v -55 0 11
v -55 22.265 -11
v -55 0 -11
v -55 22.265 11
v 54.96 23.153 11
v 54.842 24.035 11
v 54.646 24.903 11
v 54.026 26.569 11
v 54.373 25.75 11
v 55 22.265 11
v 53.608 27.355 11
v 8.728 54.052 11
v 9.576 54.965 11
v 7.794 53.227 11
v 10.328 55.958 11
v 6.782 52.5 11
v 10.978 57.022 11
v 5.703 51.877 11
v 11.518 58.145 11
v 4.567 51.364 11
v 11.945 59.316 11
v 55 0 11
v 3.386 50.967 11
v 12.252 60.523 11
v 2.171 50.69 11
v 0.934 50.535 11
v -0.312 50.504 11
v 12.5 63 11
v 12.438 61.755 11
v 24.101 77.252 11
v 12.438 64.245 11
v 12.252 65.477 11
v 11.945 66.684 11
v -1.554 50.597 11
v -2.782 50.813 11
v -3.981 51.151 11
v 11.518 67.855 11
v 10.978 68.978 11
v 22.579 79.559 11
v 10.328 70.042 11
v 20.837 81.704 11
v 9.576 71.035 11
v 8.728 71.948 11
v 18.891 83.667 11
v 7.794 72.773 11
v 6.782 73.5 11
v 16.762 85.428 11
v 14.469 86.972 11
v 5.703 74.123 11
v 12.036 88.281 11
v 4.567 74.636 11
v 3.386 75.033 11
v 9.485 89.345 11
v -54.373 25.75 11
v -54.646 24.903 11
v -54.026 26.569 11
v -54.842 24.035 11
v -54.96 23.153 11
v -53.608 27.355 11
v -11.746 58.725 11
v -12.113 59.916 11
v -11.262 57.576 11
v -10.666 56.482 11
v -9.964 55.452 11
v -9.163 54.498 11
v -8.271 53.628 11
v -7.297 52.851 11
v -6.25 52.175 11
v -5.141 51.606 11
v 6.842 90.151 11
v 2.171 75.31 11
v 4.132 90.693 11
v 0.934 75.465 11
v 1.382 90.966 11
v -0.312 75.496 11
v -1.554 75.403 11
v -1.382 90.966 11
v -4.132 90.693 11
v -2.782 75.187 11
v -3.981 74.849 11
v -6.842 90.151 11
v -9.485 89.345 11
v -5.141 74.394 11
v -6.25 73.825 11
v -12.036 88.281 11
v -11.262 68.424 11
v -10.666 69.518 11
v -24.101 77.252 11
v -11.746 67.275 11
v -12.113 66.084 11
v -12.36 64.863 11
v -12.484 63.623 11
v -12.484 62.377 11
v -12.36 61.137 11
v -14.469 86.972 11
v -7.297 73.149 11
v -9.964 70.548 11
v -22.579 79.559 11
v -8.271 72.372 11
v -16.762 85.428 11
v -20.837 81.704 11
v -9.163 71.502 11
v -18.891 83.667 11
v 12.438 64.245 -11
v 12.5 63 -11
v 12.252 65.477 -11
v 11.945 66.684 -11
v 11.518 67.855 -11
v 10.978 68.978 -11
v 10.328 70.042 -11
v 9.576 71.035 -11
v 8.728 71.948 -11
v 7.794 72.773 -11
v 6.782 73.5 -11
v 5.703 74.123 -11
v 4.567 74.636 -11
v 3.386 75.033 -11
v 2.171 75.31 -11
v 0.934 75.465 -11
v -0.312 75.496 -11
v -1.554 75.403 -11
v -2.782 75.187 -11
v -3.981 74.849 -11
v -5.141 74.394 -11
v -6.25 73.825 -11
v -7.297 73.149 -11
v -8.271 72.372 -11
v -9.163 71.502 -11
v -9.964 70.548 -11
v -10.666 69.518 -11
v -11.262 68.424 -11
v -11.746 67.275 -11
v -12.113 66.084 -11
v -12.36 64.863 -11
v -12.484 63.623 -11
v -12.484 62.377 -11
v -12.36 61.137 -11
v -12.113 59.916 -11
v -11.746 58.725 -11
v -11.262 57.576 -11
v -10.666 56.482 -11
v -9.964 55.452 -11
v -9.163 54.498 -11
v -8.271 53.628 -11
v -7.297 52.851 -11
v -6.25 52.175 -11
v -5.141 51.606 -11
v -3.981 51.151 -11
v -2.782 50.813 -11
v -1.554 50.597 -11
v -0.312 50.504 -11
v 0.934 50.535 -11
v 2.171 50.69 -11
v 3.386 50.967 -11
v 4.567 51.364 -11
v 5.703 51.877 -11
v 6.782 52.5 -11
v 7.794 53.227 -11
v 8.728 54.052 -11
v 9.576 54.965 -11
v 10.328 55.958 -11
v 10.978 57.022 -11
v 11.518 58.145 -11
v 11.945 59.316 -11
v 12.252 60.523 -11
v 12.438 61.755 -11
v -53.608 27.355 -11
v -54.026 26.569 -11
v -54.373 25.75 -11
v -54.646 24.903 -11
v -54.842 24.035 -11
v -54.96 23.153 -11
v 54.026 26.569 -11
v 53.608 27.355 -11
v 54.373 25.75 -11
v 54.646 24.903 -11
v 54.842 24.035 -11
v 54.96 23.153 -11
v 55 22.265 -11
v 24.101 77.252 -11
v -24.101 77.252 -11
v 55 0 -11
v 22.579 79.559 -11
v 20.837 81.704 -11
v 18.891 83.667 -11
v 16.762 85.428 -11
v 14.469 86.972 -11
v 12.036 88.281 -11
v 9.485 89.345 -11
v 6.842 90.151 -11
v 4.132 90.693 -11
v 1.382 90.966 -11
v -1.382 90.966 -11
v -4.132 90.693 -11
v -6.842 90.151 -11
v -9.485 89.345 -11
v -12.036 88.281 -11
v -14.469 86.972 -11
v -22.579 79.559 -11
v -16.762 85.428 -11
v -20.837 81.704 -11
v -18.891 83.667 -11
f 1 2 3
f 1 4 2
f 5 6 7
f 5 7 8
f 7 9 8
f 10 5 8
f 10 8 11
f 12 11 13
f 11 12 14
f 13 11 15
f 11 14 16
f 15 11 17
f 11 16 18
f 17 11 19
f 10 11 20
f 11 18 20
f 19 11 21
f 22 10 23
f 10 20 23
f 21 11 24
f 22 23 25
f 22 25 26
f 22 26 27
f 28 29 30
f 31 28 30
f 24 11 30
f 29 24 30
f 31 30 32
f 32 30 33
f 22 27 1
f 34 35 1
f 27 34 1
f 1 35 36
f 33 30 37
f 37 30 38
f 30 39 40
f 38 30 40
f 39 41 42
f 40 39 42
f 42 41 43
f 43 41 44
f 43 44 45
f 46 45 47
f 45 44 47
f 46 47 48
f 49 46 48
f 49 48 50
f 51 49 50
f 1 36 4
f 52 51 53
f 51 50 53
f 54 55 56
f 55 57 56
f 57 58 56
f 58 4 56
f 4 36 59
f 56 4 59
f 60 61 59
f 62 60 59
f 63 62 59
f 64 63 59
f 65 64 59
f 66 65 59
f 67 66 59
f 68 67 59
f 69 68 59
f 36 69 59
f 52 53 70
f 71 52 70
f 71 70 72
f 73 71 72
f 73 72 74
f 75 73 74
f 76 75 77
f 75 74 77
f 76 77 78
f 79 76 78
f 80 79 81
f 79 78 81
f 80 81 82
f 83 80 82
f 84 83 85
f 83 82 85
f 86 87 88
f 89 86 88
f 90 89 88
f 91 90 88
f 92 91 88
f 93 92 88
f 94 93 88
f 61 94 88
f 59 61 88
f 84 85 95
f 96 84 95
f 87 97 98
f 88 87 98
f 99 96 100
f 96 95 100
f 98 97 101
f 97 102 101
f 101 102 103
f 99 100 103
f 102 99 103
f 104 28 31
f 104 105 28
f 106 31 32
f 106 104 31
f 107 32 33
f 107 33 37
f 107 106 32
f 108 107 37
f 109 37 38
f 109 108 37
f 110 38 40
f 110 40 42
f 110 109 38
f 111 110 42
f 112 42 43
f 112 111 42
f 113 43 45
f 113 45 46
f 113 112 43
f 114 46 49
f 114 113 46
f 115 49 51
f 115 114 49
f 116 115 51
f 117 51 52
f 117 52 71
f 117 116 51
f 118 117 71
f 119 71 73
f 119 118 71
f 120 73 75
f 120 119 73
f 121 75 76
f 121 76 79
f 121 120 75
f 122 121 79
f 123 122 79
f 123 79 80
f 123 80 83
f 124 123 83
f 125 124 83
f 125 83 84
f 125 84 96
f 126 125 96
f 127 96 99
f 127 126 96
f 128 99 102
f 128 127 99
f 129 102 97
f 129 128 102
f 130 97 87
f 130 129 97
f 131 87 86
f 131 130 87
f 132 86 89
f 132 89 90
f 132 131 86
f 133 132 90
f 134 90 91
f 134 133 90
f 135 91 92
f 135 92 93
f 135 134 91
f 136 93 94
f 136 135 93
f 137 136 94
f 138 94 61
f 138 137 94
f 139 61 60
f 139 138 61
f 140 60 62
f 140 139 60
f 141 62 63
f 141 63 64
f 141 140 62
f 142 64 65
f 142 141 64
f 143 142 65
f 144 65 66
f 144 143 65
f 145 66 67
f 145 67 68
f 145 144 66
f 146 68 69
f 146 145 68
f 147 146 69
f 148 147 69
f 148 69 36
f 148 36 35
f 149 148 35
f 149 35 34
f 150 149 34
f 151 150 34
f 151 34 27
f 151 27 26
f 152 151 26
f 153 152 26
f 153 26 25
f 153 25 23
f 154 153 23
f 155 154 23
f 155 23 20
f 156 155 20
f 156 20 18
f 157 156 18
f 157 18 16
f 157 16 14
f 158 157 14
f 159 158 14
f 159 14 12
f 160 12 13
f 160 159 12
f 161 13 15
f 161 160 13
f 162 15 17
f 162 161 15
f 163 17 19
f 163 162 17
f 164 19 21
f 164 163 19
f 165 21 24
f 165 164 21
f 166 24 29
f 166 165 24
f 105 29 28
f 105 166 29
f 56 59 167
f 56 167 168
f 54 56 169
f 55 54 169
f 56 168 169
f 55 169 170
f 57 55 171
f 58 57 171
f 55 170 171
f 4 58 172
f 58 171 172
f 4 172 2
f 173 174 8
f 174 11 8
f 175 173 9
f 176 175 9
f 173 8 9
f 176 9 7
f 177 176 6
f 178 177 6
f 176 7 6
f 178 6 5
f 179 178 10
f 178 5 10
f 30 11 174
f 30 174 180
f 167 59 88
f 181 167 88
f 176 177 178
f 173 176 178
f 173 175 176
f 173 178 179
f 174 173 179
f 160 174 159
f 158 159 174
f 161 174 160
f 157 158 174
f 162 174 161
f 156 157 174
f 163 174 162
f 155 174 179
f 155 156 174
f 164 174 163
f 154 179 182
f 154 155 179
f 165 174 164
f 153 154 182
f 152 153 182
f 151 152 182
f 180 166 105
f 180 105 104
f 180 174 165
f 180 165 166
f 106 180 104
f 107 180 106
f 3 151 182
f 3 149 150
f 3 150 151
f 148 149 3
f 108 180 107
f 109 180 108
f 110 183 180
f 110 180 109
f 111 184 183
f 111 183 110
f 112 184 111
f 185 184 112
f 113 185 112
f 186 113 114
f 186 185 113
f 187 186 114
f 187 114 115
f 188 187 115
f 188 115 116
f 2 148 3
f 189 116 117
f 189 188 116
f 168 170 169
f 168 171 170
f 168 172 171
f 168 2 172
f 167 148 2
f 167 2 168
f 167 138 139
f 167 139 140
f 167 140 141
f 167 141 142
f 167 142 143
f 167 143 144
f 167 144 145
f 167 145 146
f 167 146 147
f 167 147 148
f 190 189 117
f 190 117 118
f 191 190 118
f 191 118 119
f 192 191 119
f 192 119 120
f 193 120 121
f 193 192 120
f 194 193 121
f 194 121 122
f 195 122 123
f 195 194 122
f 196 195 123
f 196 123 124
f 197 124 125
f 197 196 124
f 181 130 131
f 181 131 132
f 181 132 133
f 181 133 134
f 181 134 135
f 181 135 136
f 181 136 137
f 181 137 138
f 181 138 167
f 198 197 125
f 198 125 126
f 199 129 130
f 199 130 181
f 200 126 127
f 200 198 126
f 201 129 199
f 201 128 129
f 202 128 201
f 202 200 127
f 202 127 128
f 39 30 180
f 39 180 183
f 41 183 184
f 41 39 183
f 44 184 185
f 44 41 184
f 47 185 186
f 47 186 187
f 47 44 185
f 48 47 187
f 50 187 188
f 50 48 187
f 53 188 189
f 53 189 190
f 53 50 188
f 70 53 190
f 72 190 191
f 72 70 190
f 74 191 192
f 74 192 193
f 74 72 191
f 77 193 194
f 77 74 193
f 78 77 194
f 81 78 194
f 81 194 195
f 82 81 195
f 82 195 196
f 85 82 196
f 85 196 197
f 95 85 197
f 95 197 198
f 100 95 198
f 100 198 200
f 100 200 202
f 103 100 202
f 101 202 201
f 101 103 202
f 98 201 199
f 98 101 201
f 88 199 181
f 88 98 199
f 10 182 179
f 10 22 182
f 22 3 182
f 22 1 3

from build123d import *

# Parameters (mm, degrees)
SKETCH1_R           = 12.5
BOSS_EXTRUDE1_DEPTH = 11
BOSS_EXTRUDE2_DEPTH = 22
FILLET1_R           = 10


with BuildPart() as part:
    # Sketch1 → Boss-Extrude1 (new body, symmetric)
    with BuildSketch(Plane.XY):
        with BuildLine():
            Line((-55, 0), (55, 0))
            Line((55, 0), (55, 25))
            Line((55, 25), (28, 25))
            Line((28, 25), (28, 63))
            ThreePointArc((28, 63), (0, 91), (-28, 63))
            Line((-28, 63), (-28, 25))
            Line((-28, 25), (-55, 25))
            Line((-55, 25), (-55, 0))
        make_face()
        with Locations((0, 63)):
            Circle(SKETCH1_R, mode=Mode.SUBTRACT)
    extrude(amount=BOSS_EXTRUDE1_DEPTH, both=True)

    # Sketch2 → Boss-Extrude2 (add)
    with BuildSketch(Plane.XY.offset(11)):
        with BuildLine():
            Line((-55, 25), (-24.101425307, 77.252062944))
            ThreePointArc((-24.101425307, 77.252062944), (-27.007775812, 70.38783092), (-28, 63))
            Line((-28, 63), (-28, 25))
            Line((-28, 25), (-55, 25))
        make_face()
        with BuildLine():
            Line((55, 25), (24.101425307, 77.252062944))
            ThreePointArc((24.101425307, 77.252062944), (27.007775812, 70.38783092), (28, 63))
            Line((28, 63), (28, 25))
            Line((28, 25), (55, 25))
        make_face()
    extrude(amount=-BOSS_EXTRUDE2_DEPTH)

    # Fillet1
    fillet1_edges = [part.edges().sort_by_distance(p)[0] for p in [
        (-55, 25, 0),
        (55, 25, 0),
    ]]
    fillet(fillet1_edges, radius=FILLET1_R)


solid = part.part
